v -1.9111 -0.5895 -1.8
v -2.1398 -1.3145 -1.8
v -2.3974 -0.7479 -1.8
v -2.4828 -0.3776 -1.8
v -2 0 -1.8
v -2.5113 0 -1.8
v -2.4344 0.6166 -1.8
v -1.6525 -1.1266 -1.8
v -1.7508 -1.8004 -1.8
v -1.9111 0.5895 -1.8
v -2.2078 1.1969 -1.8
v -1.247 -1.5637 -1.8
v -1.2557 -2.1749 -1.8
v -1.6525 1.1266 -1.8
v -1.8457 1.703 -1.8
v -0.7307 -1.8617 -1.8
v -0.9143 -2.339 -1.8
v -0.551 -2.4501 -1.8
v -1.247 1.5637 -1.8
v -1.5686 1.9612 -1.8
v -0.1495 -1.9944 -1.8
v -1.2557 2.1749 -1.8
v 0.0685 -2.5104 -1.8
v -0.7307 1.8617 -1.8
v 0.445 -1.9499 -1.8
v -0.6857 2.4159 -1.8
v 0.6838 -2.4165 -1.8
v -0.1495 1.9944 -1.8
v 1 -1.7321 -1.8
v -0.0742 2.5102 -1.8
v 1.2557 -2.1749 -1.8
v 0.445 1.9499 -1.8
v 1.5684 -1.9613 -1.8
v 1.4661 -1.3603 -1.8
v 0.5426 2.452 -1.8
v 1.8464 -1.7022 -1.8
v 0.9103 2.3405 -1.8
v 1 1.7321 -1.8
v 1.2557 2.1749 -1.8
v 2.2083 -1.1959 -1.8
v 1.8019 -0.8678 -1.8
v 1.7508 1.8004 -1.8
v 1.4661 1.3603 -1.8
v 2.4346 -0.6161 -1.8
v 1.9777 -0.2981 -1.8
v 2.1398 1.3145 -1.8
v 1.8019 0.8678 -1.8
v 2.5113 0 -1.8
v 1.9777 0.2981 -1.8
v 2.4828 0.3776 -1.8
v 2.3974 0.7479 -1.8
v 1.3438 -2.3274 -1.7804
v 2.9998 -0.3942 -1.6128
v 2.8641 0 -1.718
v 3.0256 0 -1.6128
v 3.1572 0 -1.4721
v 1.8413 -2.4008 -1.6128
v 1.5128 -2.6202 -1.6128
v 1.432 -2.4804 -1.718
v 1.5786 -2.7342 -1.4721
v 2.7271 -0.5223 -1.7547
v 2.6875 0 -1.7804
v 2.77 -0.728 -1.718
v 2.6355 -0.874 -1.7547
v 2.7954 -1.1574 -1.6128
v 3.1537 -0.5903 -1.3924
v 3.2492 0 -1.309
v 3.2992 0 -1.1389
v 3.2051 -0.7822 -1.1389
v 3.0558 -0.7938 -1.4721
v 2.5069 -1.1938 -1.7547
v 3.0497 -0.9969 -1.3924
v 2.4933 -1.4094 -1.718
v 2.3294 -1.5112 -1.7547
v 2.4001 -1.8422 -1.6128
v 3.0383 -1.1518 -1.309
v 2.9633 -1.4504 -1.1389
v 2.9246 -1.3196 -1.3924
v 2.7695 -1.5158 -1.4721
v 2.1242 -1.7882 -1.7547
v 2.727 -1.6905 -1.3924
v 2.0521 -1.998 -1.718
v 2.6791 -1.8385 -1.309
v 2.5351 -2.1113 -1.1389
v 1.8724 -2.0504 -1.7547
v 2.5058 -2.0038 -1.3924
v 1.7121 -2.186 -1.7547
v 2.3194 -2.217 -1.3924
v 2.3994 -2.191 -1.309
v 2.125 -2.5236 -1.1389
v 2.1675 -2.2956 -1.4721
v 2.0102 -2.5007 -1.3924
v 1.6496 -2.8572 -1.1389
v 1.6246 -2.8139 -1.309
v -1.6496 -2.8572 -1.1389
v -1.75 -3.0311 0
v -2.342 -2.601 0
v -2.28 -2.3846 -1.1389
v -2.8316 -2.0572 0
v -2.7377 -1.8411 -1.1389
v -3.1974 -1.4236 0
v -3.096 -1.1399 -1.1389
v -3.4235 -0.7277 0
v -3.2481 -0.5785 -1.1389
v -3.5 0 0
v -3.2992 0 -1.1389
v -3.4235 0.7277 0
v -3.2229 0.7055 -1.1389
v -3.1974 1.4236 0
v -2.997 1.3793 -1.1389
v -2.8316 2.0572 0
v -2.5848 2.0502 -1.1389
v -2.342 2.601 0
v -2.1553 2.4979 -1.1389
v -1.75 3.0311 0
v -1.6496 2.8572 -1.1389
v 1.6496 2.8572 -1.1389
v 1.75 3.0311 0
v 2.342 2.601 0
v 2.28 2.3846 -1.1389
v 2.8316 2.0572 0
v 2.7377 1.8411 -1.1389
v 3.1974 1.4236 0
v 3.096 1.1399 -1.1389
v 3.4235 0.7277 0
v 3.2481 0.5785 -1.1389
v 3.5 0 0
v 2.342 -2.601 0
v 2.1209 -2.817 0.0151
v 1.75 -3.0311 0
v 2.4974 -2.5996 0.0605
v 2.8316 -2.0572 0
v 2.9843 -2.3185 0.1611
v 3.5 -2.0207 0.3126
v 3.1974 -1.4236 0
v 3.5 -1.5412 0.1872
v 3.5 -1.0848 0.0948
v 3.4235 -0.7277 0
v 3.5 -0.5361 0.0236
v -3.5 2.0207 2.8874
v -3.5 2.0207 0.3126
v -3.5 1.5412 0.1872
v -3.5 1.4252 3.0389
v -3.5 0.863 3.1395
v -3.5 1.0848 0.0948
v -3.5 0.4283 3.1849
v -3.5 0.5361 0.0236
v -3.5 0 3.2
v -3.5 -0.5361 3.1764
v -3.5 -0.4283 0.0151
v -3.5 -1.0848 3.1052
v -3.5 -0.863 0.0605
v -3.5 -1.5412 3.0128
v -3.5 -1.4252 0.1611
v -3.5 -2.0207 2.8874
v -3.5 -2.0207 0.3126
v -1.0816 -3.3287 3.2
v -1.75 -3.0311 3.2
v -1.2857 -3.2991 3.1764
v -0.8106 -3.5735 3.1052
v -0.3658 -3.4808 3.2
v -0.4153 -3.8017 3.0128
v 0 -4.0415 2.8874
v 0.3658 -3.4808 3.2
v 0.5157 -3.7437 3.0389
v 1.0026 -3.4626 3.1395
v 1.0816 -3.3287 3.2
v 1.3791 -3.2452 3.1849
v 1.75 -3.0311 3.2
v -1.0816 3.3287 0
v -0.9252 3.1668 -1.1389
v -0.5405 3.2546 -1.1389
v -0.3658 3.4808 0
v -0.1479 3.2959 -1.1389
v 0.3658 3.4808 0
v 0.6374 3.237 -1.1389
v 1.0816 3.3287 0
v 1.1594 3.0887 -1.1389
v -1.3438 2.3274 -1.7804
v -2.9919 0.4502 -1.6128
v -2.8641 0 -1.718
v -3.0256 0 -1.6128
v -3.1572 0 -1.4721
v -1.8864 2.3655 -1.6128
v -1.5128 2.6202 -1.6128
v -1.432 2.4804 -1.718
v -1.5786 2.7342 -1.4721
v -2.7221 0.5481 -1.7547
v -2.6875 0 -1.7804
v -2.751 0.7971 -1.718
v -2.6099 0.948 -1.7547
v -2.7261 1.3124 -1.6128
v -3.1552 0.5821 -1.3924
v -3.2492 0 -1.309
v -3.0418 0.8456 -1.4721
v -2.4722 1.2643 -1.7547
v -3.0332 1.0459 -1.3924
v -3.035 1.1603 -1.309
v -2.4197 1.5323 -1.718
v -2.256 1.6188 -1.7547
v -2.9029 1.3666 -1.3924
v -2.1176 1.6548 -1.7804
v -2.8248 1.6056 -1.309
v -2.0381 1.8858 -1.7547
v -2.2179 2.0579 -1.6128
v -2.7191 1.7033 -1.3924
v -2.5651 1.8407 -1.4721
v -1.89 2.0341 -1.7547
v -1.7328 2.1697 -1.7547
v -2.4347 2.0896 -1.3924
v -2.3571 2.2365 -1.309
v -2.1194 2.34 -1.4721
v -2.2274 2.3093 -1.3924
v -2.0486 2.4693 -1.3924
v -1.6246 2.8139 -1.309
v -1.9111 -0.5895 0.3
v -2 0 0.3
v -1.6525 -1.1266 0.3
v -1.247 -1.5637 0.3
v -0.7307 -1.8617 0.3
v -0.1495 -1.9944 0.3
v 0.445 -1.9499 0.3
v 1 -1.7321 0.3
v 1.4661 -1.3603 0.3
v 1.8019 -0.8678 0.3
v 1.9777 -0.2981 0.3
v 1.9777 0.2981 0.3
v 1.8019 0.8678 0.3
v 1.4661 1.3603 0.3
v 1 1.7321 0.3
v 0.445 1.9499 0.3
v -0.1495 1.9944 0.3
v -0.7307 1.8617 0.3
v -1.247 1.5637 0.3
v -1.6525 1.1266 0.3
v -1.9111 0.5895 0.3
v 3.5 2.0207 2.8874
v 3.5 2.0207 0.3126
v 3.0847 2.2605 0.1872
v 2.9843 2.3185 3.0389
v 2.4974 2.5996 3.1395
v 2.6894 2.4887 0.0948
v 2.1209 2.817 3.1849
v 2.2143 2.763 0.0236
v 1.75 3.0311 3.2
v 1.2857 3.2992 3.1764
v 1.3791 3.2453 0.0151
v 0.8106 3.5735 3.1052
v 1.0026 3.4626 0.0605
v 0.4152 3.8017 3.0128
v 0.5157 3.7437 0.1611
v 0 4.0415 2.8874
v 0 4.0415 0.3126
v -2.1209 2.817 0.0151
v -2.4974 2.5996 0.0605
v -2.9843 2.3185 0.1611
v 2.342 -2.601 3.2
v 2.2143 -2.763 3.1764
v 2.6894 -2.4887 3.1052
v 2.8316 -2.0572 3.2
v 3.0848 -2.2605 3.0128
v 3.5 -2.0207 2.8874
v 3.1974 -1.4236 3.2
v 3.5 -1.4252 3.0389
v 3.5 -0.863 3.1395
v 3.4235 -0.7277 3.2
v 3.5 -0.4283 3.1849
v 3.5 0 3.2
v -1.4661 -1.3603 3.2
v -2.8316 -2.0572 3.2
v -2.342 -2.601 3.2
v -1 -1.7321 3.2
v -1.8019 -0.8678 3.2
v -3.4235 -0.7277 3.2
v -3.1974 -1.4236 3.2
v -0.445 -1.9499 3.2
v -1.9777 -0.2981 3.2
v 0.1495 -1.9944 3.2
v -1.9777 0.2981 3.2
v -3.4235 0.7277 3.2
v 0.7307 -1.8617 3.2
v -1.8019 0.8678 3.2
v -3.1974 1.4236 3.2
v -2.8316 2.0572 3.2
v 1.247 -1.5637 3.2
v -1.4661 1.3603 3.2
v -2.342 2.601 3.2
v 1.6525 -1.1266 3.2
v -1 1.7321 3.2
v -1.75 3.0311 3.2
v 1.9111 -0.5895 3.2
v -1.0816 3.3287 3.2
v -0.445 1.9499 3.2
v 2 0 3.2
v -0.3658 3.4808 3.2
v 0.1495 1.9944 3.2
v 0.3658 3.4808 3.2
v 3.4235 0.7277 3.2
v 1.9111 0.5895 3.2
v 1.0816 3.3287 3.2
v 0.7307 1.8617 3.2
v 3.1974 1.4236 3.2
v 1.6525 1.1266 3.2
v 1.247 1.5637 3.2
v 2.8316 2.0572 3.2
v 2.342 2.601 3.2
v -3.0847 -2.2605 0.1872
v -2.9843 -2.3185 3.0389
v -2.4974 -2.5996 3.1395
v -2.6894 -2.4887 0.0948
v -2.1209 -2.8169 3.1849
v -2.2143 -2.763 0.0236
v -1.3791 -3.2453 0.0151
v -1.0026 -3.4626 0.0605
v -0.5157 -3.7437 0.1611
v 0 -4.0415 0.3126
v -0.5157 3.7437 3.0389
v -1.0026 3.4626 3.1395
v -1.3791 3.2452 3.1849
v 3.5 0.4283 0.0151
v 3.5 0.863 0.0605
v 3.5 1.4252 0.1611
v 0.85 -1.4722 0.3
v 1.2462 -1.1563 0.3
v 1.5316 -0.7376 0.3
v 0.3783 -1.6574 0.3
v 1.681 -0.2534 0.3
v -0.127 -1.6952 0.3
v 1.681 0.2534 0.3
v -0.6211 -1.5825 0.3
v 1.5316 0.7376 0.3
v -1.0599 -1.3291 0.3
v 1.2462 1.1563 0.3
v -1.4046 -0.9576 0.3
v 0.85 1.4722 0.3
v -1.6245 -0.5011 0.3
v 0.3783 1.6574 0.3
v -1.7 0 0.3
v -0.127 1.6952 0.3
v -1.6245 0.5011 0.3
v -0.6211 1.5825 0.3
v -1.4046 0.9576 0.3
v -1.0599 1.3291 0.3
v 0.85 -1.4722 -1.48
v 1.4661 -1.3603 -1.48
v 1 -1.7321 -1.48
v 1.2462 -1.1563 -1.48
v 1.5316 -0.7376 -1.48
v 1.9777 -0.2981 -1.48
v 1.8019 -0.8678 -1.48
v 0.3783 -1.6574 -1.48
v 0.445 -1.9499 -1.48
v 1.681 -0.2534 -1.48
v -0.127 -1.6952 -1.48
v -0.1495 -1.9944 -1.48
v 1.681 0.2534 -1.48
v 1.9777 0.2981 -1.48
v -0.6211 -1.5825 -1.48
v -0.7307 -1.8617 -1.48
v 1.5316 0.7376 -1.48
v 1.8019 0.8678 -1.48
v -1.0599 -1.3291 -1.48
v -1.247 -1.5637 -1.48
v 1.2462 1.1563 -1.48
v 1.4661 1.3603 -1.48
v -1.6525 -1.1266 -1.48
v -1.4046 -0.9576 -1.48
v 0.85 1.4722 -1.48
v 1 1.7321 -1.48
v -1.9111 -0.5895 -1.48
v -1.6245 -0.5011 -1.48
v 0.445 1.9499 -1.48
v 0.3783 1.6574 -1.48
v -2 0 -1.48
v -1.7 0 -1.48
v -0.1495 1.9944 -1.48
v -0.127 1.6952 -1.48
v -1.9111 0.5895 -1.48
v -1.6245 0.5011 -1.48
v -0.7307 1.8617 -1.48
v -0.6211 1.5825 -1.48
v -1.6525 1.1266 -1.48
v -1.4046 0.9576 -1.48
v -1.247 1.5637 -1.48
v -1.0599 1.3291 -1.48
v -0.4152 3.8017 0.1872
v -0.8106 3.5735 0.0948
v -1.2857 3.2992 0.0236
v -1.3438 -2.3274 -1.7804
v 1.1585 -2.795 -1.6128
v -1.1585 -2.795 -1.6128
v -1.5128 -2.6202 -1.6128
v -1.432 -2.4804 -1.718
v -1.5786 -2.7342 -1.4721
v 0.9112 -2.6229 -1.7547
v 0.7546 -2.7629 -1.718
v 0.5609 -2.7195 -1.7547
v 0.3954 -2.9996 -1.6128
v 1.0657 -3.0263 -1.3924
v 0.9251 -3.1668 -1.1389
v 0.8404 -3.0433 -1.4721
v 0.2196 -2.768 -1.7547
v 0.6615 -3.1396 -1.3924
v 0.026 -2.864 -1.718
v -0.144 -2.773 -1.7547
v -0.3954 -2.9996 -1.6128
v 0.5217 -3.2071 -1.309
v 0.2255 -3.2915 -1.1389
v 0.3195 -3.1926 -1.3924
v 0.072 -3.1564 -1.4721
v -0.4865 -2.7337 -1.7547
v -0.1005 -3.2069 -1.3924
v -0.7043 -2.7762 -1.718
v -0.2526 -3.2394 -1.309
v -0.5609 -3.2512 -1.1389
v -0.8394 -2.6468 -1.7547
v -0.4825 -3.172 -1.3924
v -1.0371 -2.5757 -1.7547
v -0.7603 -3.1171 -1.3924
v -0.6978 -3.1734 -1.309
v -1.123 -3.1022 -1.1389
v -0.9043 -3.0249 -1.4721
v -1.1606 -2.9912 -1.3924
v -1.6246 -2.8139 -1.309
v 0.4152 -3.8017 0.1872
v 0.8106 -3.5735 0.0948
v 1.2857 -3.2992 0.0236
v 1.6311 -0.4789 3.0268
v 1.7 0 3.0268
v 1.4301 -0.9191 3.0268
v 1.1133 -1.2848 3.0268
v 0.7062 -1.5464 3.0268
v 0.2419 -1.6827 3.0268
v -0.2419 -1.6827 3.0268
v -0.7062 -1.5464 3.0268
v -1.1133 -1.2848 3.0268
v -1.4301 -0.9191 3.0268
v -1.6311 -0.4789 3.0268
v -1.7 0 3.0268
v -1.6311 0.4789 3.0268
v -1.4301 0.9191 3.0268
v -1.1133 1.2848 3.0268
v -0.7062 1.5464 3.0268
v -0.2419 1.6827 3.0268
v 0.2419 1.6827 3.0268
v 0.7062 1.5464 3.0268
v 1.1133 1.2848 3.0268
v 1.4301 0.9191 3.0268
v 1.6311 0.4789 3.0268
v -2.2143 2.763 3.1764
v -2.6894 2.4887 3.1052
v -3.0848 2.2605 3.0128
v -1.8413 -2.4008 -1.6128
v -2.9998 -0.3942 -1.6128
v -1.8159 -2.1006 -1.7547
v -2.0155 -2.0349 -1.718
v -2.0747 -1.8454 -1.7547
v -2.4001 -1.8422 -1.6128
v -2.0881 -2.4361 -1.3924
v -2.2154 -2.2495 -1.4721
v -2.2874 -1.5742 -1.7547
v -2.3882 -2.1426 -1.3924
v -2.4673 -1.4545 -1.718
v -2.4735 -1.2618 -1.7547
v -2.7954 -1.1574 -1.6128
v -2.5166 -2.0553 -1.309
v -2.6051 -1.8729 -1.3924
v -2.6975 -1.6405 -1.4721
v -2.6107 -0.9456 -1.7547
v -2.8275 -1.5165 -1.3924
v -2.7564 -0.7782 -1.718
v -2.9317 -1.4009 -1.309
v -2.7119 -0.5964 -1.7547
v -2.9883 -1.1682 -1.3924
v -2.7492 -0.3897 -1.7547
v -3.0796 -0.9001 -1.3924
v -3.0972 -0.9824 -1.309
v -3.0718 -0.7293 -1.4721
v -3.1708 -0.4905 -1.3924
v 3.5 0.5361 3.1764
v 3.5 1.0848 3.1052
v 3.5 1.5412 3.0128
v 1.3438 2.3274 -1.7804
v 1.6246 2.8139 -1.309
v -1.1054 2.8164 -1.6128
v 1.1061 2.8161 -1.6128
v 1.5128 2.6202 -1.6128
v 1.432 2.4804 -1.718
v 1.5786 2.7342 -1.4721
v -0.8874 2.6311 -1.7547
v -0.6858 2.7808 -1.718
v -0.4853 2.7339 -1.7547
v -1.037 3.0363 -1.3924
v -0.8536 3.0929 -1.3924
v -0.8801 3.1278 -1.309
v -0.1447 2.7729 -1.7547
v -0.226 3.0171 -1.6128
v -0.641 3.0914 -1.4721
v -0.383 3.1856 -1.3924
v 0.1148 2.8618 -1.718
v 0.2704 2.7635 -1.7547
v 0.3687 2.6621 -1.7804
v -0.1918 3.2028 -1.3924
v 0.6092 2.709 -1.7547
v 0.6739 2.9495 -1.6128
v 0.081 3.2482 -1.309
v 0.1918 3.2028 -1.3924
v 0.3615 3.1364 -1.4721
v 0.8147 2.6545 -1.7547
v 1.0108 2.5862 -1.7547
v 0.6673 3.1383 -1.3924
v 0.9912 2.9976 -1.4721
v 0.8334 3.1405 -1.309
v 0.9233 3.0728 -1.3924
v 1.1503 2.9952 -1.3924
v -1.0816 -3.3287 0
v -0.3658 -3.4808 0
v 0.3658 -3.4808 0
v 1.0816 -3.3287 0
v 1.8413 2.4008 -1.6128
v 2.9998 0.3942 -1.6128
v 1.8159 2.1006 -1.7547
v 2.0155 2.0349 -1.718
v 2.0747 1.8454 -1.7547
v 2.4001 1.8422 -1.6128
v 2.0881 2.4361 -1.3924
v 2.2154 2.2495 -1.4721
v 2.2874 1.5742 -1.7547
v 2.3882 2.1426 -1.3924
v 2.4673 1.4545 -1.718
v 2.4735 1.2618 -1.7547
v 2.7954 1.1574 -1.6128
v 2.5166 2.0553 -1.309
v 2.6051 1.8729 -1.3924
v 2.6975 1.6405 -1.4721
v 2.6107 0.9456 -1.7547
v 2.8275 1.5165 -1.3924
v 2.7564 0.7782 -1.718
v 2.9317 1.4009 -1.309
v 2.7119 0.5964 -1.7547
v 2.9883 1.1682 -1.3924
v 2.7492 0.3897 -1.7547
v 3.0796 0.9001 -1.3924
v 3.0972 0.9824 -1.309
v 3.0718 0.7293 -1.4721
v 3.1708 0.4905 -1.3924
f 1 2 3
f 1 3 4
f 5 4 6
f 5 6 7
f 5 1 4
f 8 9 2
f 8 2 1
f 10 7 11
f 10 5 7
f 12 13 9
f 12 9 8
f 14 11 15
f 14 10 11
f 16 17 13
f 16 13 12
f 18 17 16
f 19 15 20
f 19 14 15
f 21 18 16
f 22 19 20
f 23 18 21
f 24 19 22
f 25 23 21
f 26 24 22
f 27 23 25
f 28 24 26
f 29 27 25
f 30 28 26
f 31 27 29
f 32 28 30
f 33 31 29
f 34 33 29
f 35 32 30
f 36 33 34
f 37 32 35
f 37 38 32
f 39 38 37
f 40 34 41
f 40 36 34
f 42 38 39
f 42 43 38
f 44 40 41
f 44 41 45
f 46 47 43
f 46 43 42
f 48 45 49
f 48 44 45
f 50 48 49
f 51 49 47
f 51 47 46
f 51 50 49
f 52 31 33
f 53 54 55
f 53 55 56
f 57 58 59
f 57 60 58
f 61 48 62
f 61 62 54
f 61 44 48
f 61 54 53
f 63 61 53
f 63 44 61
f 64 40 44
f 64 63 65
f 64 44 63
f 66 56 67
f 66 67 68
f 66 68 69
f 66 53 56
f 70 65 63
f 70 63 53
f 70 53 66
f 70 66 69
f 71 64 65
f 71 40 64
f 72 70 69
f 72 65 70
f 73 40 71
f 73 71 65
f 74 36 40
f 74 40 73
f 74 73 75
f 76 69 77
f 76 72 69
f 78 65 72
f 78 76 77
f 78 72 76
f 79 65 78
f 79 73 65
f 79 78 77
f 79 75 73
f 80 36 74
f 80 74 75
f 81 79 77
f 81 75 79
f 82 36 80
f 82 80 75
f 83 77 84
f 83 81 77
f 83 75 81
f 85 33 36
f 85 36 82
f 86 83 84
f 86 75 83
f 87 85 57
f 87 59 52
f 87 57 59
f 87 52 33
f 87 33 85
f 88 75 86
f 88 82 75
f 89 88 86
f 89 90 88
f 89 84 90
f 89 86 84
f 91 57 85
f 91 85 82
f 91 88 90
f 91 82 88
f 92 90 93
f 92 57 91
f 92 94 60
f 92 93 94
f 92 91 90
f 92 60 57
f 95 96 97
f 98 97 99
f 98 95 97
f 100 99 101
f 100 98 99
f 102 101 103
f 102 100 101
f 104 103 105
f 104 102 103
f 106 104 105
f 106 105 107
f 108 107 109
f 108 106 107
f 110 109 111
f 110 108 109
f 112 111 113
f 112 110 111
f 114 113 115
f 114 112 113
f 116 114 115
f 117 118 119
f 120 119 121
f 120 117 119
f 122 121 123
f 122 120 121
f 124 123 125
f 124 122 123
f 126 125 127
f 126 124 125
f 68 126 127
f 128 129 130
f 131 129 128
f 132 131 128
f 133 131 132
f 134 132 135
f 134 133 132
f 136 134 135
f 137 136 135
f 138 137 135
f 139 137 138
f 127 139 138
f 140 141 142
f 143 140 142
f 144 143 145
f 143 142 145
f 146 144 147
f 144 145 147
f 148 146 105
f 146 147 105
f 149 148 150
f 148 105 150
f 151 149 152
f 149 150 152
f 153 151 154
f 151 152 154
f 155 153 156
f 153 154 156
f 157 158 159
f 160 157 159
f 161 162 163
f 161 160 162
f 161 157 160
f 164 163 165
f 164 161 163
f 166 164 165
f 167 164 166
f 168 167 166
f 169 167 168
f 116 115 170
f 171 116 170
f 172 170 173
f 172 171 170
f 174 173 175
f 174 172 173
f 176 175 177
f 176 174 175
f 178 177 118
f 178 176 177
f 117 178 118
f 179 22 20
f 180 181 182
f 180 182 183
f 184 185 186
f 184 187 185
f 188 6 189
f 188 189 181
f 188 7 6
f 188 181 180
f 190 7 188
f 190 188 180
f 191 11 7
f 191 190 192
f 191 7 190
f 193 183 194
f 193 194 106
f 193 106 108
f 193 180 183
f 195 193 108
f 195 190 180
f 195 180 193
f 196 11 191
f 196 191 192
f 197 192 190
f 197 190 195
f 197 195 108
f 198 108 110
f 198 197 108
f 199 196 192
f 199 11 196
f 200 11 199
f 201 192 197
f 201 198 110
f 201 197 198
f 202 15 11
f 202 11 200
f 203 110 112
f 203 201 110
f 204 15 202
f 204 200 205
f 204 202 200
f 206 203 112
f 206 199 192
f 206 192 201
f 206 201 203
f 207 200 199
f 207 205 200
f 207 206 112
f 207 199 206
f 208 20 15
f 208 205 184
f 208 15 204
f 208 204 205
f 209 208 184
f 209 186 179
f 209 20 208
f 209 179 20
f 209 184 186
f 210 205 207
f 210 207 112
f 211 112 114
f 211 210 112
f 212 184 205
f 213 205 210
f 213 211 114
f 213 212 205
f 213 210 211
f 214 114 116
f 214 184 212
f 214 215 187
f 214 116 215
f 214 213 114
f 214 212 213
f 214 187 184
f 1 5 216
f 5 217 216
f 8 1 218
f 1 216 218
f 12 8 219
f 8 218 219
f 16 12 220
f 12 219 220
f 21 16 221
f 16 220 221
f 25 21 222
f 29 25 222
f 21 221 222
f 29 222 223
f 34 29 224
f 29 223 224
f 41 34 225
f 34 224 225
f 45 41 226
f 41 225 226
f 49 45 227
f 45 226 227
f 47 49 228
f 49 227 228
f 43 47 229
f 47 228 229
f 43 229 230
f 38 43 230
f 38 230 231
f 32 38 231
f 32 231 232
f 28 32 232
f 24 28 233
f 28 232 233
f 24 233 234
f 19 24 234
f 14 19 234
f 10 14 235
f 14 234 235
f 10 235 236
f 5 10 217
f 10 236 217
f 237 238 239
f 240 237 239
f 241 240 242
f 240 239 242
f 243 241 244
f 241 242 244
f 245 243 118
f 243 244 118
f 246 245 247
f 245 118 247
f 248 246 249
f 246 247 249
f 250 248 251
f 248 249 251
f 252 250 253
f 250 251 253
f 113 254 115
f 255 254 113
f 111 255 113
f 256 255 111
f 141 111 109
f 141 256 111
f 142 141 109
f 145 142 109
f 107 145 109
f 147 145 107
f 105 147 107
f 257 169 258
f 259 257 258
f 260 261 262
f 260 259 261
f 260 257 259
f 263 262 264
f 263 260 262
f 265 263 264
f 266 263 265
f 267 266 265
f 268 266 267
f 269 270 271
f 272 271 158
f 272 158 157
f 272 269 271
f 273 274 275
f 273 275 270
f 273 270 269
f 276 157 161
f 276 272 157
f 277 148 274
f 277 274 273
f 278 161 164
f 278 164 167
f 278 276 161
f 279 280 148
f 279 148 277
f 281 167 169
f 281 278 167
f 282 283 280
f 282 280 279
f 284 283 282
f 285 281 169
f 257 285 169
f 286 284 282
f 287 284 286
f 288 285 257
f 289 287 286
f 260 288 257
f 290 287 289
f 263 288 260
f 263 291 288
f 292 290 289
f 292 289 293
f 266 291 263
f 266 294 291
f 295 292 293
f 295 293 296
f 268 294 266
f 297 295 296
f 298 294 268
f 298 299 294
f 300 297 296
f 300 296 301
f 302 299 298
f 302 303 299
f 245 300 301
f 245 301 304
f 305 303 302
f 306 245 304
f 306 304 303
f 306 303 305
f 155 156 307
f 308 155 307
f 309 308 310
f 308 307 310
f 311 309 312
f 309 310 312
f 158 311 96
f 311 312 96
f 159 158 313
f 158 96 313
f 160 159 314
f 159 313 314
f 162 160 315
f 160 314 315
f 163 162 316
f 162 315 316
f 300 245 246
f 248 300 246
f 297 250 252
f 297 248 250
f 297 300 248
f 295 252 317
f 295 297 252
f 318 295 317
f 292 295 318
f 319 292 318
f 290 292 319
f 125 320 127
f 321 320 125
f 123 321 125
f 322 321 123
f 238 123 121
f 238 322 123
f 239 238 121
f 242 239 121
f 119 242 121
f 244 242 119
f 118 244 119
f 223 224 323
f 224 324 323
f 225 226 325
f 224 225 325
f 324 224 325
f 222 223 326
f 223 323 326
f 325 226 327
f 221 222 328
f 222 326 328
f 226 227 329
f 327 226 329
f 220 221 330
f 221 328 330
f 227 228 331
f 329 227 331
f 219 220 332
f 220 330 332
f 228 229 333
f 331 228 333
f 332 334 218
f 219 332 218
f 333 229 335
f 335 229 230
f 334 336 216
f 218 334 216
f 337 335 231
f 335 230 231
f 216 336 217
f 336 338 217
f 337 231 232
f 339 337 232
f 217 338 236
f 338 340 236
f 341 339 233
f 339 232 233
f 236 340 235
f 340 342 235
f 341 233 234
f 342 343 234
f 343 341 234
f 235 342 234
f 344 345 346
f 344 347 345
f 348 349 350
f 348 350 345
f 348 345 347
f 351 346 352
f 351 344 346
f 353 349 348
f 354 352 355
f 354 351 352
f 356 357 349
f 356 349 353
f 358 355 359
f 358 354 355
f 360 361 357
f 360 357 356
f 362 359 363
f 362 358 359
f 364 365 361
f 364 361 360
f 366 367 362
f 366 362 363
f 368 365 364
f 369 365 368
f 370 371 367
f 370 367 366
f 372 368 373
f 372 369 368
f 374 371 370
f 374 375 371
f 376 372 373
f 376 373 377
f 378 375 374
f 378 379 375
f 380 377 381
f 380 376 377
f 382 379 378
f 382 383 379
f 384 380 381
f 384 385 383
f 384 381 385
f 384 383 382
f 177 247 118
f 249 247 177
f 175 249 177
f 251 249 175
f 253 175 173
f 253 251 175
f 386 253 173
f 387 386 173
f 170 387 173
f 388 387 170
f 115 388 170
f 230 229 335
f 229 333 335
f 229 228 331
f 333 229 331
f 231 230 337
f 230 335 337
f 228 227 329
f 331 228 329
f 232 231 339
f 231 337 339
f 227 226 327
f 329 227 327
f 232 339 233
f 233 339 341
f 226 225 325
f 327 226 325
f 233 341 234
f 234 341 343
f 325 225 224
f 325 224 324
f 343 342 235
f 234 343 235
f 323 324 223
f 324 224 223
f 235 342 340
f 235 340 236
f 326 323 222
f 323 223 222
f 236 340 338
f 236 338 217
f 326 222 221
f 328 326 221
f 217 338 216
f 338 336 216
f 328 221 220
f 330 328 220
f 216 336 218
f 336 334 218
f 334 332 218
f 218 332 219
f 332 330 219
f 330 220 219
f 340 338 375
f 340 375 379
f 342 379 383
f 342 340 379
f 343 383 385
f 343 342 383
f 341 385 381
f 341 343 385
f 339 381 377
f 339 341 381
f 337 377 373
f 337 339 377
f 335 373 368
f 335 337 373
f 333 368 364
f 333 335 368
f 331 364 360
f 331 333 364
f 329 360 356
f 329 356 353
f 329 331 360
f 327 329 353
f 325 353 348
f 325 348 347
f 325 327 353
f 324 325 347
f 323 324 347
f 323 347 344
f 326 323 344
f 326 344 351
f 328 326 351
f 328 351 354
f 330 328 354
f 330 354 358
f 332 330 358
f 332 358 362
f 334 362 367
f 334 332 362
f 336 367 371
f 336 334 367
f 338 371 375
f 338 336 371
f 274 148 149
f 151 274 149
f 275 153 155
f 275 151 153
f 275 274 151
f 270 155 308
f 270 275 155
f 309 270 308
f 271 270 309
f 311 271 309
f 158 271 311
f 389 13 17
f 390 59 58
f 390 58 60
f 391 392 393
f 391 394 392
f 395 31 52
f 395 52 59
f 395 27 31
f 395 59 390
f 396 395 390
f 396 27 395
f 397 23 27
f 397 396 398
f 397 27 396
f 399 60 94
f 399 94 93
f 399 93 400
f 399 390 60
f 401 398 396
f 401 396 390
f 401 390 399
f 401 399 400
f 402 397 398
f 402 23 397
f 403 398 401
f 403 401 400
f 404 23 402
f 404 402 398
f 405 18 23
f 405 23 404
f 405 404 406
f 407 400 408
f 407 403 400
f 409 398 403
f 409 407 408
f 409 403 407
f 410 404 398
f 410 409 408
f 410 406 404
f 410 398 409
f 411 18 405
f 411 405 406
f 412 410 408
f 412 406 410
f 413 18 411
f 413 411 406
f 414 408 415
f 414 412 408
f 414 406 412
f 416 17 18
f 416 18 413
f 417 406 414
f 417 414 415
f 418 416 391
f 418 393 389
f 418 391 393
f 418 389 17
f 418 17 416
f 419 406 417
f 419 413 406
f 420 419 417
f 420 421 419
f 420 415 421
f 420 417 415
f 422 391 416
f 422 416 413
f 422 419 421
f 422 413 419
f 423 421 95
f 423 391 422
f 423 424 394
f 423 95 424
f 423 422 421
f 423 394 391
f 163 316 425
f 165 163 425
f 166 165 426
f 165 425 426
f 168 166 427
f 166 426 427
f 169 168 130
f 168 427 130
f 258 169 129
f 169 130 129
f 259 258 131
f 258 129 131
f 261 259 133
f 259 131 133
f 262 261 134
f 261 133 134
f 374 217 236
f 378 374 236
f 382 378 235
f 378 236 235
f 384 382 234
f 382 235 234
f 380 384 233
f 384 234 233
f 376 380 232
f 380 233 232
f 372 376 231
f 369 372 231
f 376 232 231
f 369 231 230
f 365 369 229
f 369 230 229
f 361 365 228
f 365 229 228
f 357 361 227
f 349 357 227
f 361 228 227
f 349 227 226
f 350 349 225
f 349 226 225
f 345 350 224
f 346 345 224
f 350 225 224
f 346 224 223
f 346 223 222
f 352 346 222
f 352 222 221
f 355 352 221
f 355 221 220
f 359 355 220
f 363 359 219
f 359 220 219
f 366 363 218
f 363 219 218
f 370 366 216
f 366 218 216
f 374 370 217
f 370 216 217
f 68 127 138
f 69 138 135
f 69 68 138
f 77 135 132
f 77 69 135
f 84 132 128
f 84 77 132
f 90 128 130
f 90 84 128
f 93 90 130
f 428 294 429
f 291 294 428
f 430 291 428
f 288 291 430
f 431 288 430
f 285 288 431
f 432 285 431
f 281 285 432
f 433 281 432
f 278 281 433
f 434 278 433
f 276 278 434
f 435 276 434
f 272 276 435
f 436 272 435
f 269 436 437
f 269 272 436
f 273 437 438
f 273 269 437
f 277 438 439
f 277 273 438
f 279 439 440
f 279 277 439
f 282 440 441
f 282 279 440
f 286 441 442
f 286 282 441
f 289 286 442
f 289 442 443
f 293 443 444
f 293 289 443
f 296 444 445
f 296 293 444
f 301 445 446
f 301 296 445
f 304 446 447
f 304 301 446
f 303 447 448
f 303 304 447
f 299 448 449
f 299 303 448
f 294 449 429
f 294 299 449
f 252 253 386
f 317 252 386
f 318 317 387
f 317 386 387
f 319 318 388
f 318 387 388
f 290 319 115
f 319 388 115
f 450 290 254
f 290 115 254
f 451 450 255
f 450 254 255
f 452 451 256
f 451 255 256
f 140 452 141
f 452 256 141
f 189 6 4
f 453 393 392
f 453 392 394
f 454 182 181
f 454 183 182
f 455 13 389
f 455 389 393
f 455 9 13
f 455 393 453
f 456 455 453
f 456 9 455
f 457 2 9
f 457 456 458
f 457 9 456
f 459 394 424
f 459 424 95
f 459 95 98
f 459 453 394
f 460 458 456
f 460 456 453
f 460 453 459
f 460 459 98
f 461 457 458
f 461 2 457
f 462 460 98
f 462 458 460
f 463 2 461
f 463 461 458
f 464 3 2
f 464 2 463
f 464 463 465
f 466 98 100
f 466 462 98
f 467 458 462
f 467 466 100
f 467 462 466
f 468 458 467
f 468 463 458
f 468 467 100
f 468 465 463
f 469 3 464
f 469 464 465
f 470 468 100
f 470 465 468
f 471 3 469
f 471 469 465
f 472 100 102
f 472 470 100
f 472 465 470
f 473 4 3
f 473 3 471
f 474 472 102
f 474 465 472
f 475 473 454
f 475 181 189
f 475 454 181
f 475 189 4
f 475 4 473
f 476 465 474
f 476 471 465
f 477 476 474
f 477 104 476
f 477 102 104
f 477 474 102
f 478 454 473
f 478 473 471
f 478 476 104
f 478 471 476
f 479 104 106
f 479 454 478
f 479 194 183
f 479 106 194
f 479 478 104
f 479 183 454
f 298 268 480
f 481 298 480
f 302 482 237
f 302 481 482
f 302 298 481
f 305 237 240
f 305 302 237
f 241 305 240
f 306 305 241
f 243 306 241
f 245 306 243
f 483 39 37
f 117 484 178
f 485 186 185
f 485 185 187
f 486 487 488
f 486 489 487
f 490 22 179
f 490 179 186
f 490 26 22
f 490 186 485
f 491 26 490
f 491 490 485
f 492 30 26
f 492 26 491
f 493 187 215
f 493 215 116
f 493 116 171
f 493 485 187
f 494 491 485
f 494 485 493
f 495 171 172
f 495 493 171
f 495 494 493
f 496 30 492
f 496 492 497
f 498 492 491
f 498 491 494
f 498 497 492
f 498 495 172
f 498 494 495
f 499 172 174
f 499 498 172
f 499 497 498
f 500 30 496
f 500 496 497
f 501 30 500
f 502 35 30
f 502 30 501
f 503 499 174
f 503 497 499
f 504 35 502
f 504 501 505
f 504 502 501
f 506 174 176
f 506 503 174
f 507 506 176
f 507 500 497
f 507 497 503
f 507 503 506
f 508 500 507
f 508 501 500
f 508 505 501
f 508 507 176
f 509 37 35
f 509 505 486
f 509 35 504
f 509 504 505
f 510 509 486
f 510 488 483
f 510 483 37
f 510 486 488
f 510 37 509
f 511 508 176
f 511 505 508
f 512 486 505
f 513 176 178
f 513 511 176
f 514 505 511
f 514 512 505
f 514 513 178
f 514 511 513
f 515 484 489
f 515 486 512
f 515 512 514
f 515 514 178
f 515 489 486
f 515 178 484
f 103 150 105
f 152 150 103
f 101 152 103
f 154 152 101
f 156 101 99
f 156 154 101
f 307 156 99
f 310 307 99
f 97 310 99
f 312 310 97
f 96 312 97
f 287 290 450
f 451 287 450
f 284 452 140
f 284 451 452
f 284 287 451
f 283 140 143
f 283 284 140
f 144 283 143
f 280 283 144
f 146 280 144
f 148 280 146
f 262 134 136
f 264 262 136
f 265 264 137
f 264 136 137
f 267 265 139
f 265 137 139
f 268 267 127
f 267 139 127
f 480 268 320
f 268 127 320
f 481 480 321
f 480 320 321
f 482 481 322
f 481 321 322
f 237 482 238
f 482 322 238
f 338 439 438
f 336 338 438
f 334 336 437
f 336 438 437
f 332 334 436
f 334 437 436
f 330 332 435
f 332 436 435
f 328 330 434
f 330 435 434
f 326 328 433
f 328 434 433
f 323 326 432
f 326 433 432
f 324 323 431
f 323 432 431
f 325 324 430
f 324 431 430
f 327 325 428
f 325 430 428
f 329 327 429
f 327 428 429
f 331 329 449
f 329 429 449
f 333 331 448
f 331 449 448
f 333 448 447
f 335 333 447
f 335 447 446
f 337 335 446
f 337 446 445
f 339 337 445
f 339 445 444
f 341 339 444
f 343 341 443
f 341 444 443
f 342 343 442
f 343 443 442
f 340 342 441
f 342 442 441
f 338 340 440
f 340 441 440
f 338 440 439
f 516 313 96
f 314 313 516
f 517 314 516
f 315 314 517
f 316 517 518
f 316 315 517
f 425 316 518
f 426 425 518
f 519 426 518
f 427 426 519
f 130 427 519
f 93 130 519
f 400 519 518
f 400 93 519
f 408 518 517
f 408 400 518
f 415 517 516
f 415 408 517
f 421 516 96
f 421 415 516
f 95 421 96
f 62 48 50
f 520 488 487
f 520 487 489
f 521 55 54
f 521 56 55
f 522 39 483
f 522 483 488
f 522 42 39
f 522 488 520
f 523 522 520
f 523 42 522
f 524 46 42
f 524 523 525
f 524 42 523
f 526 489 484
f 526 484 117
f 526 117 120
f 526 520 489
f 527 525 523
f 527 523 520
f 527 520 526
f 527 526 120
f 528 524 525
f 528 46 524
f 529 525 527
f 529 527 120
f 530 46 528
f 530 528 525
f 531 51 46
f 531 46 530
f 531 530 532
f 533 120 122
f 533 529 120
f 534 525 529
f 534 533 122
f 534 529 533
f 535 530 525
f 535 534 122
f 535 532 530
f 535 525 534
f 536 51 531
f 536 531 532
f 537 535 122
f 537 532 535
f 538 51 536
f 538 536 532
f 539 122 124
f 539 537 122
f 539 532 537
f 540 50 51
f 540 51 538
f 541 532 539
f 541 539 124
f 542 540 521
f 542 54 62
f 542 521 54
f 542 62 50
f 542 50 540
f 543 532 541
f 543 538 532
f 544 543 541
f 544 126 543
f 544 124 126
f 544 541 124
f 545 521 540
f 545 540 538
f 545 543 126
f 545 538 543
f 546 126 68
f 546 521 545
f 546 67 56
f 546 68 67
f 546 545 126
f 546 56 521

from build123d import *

# Parameters (mm, degrees)
VYSUNOUT1_DEPTH = 3.2
VYSUNOUT2_DEPTH = 1.8
VYSUNOUT2_TAPER = 10
ZAOBLIT1_R      = 0.8
SKICA5_R        = 2
SKICA5_R_2      = 1.7
VYSUNOUT3_DEPTH = 1.78


with BuildPart() as part:
    # Skica1 → Vysunout1 (new body)
    with BuildSketch(Plane.XY):
        Polygon((3.5, -2.020725942), (3.5, 2.020725942), (0, 4.041451884), (-3.5, 2.020725942), (-3.5, -2.020725942), (0, -4.041451884), align=None)
    extrude(amount=VYSUNOUT1_DEPTH)

    # Skica2 → Odebrat otočením1 (revolve, cut)
    with BuildSketch(Plane(origin=(0, 0, 0), x_dir=(1, 0, 0), z_dir=(0, 1, 0))):
        Polygon((6.271281292, -3.2), (6.271281292, -1.6), (3.5, -3.2), align=None)
        Polygon((6.271281292, 0), (3.5, 0), (6.271281292, -1.6), align=None)
    revolve(axis=Axis((0, 0, 0), (0, 0, 1)), mode=Mode.SUBTRACT)

    # Skica3 → Vysunout2 (add)
    with BuildSketch(Plane(origin=(0, 0, 0), x_dir=(-1, 0, 0), z_dir=(0, 0, -1))):
        with BuildLine():
            ThreePointArc((-1.75, 3.031088913), (-3.031088913, 1.75), (-3.5, 0))
            ThreePointArc((-3.5, 0), (-3.031088913, -1.75), (-1.75, -3.031088913))
            ThreePointArc((-1.75, -3.031088913), (0, -3.5), (1.75, -3.031088913))
            ThreePointArc((1.75, -3.031088913), (3.031088913, -1.75), (3.5, 0))
            ThreePointArc((3.5, 0), (3.031088913, 1.75), (1.75, 3.031088913))
            ThreePointArc((1.75, 3.031088913), (0, 3.5), (-1.75, 3.031088913))
        make_face()
    extrude(amount=VYSUNOUT2_DEPTH, taper=VYSUNOUT2_TAPER)

    # Zaoblit1
    zaoblit1_edges = [part.edges().sort_by_distance(p)[0] for p in [
        (0, 3.182611435, -1.8),
    ]]
    fillet(zaoblit1_edges, radius=ZAOBLIT1_R)

    # Skica4 → Odebrat otočením2 (revolve, cut)
    with BuildSketch(Plane(origin=(0, 0, 0), x_dir=(1, 0, 0), z_dir=(0, 1, 0))):
        Polygon((-2, 1.8), (-2, -0.3), (-1.7, -0.3), (-1.7, -3.2), (0, -3.2), (0, 1.8), align=None)
    revolve(axis=Axis((0, 0, -1.8), (0, 0, 1)), mode=Mode.SUBTRACT)

    # Skica6 → Odebrat otočením3 (revolve, cut)
    with BuildSketch(Plane(origin=(0, 0, 0), x_dir=(1, 0, 0), z_dir=(0, 1, 0))):
        Polygon((0, -2.045299462), (2, -3.2), (0, -3.2), align=None)
    revolve(axis=Axis((0, 0, 3.2), (0, 0, -1)), mode=Mode.SUBTRACT)


with BuildPart() as body_2:
    # Skica5 → Vysunout3 (new body)
    with BuildSketch(Plane(origin=(0, 0, 0.3), x_dir=(-1, 0, 0), z_dir=(0, 0, -1))):
        Circle(SKICA5_R)
        Circle(SKICA5_R_2, mode=Mode.SUBTRACT)
    extrude(amount=VYSUNOUT3_DEPTH)


solid = Compound([part.part, body_2.part])
